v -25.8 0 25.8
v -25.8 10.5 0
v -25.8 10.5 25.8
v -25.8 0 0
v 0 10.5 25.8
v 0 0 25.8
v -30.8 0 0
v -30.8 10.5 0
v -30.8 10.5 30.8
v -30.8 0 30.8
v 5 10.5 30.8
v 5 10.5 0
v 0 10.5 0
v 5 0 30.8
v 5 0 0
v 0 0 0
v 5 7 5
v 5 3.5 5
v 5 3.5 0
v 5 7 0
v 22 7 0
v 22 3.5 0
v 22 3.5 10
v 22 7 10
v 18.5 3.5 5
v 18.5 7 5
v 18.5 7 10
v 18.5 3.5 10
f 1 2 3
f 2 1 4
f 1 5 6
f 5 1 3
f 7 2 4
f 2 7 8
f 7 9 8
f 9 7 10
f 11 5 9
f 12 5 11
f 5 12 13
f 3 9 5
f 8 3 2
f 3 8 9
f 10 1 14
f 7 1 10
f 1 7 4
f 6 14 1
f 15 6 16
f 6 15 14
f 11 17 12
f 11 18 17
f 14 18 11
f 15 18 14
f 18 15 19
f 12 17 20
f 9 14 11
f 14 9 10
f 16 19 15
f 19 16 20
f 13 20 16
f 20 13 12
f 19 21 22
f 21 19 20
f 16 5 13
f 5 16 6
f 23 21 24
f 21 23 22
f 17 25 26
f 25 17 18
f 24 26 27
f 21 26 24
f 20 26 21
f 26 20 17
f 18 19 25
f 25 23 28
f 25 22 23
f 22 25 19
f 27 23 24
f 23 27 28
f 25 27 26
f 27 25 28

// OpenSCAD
// file: hook.scad
extrusion_p=25.8;

module bucket_hook(width, thickness, tail) {
    translate([-extrusion_p,0,0])
    union() {
        cube([thickness,width,extrusion_p]);
        translate([0,0,extrusion_p])
        cube([extrusion_p+thickness*2,width, thickness]);
        translate([extrusion_p+thickness,0,-tail])
        cube([thickness,width,extrusion_p+tail]);
    }
}
// main file
use <hook.scad>;

extrusion_p=25.8;

module soldering() {
    hook_width=70;
    hook_thickness=5;
    hook_height=0;

    translate([-hook_thickness,0,0])
    bucket_hook(hook_width, hook_thickness, hook_height);

    spool_id=21;
    spool_od=49;
    spool_h=41;

    translate([-extrusion_p/2,hook_width/2,extrusion_p])
    cylinder(r=spool_id * 0.6 / 2, h=spool_h+5, $fn=100);

    iron_d=13.55;
    iron_t=3;
    difference() {
    //outer
        union() {
            translate([iron_d+iron_t,(iron_d+iron_t)/2,0])
            cylinder(r=(iron_d+iron_t)/2, h=10,$fn=100);
            translate([0,0,0])
            cube([iron_d+iron_t,iron_d+iron_t,10]);
        }

        translate([iron_d+iron_t,(iron_d+iron_t)/2,0])
        cylinder(r=iron_d/2, h=10,$fn=100);
    }

    pump_d=21;
    pump_t=3;

    translate([0,-1,0])
    difference() {
        union() {
            translate([pump_d+pump_t,hook_width/2,0])
            cylinder(r=(pump_d+pump_t)/2, h=10, $fn=100);

            translate([0,hook_width/2-(pump_d+pump_t)/2,0])
            cube([pump_d+pump_t,pump_d+pump_t,10]);
        }
        translate([pump_d+pump_t,hook_width/2,0])
        cylinder(r=pump_d/2, h=10, $fn=100);
    }

    pen_d=15.5;
    pen_t=3;

    difference() {
        union() {
            translate([pen_d+pen_t,hook_width-(pen_d+pen_t)/2,0])
            cylinder(r=(pen_d+pen_t)/2, h=10, $fn=100);

            translate([0,hook_width-(pen_d+pen_t),0])
            cube([pen_d+pen_t,pen_d+pen_t,10]);
        }
        translate([pen_d+pen_t,hook_width-(pen_d+pen_t)/2,0])
        cylinder(r=pen_d/2, h=10, $fn=100);
    }
}

module tool_holder(d=15, t=3, h=10) {
    hook_width=d+t;
    hook_thickness=5;
    hook_height=0;

    translate([-hook_thickness,0,0])
    bucket_hook(hook_width, hook_thickness, hook_height);

    difference() {
        union() {
            translate([d+t,(d+t)/2,0])
            cylinder(r=(d+t)/2, h=h,$fn=100);
            translate([0,0,0])
            cube([d+t,d+t,h]);
        }

        translate([d+t,(d+t)/2,0])
        cylinder(r=d/2, h=h,$fn=100);
    }
}

module tool_hook(l=22, t=3.5, h=5) {
    hook_width=t*3;
    hook_thickness=5;
    hook_height=0;

    translate([-hook_thickness,0,0])
    bucket_hook(hook_width, hook_thickness, hook_height);

    translate([0,t,0])
    cube([l,t,h]);

    translate([l-t,t,h])
    cube([t,t,h]);

}

tool_hook();
